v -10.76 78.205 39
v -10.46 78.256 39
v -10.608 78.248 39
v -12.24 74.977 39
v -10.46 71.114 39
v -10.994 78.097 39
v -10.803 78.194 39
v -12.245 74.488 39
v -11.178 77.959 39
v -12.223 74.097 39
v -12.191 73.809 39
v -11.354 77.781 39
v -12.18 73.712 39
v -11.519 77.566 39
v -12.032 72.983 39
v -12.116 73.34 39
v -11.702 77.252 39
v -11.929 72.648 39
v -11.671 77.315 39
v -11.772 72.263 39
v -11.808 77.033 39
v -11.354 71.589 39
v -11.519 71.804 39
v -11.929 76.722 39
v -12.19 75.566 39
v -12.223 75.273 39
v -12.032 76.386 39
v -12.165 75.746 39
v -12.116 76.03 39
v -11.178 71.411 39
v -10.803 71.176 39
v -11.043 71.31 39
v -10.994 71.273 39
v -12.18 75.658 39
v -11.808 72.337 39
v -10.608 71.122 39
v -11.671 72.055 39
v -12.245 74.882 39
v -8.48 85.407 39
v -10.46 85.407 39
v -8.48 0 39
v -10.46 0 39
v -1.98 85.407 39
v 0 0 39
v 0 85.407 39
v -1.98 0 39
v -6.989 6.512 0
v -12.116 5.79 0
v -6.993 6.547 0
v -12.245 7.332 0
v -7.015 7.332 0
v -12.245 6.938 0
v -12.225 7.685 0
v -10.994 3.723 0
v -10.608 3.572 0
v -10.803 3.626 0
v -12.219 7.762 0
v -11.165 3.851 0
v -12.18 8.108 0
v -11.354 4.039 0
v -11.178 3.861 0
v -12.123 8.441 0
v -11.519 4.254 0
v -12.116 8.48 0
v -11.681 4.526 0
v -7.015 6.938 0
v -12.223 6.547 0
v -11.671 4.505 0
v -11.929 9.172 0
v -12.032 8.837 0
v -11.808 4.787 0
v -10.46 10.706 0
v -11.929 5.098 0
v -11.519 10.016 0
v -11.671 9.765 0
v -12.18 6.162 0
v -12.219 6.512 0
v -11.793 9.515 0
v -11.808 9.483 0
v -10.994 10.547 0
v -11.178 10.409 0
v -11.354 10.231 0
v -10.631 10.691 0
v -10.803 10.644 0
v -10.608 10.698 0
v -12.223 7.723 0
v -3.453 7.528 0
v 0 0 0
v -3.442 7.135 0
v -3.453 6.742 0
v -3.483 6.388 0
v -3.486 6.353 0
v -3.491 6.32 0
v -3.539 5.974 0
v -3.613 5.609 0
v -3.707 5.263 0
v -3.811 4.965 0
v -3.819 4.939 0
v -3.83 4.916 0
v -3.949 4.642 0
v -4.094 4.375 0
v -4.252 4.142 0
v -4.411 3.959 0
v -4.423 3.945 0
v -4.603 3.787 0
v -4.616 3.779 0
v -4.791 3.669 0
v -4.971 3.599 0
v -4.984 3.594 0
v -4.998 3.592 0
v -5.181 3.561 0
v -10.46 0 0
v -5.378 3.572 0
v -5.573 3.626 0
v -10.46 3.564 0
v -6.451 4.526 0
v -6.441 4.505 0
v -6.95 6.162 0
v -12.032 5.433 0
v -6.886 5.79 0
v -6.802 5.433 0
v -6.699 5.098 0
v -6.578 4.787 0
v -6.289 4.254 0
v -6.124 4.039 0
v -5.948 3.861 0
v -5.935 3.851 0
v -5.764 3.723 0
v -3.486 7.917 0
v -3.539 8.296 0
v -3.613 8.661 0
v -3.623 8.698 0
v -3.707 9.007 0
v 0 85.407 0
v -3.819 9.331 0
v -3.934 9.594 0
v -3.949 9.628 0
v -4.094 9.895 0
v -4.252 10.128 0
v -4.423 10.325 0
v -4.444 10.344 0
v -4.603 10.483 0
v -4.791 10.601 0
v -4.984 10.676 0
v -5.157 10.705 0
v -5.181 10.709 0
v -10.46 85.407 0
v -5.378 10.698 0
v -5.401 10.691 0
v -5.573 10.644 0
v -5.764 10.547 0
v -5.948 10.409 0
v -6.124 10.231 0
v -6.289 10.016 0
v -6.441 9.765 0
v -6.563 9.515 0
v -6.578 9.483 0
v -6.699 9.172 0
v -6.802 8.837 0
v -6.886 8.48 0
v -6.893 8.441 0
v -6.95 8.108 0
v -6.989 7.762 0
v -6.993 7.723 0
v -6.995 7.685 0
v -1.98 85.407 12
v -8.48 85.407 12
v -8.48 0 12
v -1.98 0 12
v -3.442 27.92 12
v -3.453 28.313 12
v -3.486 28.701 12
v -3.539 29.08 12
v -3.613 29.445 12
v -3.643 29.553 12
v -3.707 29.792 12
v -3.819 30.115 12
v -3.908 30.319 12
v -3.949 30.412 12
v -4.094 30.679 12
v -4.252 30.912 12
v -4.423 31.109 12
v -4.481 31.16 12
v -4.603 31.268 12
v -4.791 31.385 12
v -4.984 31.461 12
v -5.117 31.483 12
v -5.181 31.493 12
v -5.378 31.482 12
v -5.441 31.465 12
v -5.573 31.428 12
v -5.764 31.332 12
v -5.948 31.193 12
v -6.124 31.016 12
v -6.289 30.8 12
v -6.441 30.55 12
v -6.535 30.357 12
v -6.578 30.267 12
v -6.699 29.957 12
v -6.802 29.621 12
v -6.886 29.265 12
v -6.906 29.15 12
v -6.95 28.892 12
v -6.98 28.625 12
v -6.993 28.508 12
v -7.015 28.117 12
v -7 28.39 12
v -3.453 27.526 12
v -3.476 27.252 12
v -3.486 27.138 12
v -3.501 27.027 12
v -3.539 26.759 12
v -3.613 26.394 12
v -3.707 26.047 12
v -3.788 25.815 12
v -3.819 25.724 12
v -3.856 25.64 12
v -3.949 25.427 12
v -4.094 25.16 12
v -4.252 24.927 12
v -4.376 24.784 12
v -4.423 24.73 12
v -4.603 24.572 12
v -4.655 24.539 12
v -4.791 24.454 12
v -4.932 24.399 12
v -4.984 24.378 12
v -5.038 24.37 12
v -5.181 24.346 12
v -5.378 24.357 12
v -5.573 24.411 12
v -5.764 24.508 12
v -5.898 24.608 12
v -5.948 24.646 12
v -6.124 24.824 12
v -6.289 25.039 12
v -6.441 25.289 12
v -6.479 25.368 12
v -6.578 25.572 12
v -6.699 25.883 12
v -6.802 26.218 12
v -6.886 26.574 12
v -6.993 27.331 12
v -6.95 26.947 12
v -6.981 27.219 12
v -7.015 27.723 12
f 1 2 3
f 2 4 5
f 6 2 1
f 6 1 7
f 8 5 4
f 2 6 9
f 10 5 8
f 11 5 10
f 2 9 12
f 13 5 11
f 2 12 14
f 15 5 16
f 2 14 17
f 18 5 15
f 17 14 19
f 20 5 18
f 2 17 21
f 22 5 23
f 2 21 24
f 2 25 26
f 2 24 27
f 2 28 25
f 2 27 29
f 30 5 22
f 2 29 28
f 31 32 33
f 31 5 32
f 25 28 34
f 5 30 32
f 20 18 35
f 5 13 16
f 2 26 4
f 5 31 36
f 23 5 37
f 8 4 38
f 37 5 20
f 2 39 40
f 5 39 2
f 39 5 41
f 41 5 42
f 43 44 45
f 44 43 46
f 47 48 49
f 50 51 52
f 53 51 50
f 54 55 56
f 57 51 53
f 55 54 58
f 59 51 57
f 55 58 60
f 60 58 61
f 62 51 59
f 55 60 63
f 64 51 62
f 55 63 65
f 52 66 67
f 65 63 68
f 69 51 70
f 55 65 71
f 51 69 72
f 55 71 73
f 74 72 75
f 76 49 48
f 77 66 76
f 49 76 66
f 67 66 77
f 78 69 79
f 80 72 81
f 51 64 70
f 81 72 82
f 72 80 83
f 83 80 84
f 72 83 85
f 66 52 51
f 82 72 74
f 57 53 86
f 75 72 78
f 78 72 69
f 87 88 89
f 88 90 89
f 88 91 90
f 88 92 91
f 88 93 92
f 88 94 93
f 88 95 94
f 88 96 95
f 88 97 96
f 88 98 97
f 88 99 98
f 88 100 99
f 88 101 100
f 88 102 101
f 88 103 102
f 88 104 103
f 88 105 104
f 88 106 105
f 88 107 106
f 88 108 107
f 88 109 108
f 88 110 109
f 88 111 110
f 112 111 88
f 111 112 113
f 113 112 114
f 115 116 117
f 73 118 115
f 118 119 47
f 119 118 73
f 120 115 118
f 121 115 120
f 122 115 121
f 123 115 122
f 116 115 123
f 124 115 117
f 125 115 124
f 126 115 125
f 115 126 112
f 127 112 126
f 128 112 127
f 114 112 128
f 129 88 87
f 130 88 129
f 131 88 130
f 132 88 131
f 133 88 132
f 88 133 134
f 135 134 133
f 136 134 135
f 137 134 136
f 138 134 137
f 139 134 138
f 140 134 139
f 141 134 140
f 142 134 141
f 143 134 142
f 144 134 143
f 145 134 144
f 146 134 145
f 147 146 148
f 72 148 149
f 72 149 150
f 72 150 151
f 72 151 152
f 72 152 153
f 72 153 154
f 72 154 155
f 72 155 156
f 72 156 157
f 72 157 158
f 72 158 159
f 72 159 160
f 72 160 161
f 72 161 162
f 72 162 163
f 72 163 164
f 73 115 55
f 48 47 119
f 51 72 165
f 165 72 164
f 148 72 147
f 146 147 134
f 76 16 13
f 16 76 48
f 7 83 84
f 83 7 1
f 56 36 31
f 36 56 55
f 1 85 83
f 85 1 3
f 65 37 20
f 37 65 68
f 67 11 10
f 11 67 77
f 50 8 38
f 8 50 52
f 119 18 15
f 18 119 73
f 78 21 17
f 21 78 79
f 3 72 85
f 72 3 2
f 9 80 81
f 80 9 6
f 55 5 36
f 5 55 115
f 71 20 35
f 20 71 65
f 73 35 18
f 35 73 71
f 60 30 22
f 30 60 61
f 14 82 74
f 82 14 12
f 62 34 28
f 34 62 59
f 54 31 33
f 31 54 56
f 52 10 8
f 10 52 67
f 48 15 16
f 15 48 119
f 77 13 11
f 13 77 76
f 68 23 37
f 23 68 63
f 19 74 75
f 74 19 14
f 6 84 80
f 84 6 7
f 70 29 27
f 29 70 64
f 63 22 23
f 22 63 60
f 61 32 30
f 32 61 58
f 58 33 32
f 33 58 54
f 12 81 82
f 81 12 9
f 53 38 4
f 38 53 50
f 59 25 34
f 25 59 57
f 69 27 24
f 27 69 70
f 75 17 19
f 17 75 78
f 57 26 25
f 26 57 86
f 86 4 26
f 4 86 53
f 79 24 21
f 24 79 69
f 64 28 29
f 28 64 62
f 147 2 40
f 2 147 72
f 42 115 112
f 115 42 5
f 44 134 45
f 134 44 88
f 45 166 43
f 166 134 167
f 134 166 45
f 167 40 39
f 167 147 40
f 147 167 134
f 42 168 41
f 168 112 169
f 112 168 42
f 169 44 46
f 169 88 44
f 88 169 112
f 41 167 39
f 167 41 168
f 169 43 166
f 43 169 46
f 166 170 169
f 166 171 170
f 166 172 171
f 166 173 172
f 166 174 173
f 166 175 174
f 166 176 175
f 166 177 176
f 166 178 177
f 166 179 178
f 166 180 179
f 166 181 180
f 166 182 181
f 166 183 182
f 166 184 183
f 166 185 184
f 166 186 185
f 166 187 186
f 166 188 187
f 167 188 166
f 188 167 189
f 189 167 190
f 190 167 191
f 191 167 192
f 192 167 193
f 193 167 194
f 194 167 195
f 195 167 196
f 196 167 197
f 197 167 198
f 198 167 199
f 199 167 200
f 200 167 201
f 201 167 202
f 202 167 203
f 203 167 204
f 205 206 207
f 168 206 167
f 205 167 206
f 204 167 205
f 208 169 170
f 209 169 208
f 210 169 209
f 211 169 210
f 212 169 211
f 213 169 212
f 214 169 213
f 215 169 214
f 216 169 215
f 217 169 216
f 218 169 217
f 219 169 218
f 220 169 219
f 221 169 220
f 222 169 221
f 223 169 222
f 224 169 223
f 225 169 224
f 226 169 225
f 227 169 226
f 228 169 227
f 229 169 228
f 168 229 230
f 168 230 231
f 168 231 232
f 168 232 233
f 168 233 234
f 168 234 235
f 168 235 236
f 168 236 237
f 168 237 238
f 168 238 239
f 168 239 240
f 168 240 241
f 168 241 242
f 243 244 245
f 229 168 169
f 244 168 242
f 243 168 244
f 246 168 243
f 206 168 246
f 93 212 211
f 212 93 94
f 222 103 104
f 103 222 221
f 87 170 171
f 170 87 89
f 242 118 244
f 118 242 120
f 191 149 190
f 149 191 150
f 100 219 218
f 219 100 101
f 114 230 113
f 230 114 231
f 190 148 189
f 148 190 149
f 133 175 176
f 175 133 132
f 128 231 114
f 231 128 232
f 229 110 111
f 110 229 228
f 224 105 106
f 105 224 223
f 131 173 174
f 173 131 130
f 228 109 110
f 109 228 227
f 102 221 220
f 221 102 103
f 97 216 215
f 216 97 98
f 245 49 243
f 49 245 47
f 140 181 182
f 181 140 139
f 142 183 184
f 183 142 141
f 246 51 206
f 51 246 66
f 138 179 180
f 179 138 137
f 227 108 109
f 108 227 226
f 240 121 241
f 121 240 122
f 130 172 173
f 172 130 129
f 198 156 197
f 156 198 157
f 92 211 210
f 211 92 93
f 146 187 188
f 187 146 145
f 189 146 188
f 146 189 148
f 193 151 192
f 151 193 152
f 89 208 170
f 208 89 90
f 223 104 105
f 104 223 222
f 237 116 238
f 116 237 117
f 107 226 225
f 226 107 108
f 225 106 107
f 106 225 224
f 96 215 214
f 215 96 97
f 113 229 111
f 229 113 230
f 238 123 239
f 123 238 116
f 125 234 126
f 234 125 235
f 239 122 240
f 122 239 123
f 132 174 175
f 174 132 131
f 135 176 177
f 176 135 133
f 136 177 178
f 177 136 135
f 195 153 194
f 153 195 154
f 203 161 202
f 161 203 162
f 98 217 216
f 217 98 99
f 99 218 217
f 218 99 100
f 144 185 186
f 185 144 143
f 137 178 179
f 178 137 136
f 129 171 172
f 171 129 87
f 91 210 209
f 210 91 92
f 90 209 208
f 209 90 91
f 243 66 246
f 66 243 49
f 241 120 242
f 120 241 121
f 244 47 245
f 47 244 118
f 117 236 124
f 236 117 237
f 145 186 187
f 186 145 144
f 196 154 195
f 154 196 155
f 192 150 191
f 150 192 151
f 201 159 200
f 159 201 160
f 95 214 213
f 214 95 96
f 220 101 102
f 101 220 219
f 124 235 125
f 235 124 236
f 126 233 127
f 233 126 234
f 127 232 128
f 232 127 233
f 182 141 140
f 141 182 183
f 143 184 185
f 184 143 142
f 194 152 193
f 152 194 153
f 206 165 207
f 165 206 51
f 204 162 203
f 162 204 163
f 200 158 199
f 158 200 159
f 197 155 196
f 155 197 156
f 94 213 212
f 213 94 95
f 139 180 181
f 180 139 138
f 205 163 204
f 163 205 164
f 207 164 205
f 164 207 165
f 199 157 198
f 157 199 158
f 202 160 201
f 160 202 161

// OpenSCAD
// Parametric angled edge hole jig, created by Nick Estes <nick@nickstoys.com>
// Released under a Creative Commons - attribute - share alike license

fin_thickness = 6.5;
jig_width = 27;
hole_angle = 60;
hole_dia = 0.125*25.4;
thickness = 1.98;
drill_guide_length = 12;

fudge_factor = 0.4;

$fs = 0.2;
$fa = 0.2;

jig_length = tan(hole_angle)*(jig_width+drill_guide_length+thickness*2+hole_dia*2);

rotate([0,-90,0]) difference() {
    union() {
        cube([jig_width+drill_guide_length,jig_length,fin_thickness+thickness*2]);
        translate([0,0,thickness*2+fin_thickness-hole_dia/2-1]) intersection() {
            cube([jig_width+drill_guide_length,jig_length,fin_thickness+thickness*2]);
            translate([0,0,hole_dia/2+1]) rotate([0,0,hole_angle]) rotate([0,90,0]) translate([0,hole_dia/2+thickness,-5]) cylinder((jig_width+drill_guide_length)/cos(hole_angle)+40, d=hole_dia+fudge_factor);
        }
    }
    translate([drill_guide_length,-0.5,thickness]) cube([jig_width+1,jig_length+1,fin_thickness]);
    translate([0,0,thickness+fin_thickness/2]) rotate([0,0,hole_angle]) rotate([0,90,0]) translate([0,hole_dia/2+thickness,-5]) cylinder((jig_width+drill_guide_length)/cos(hole_angle)+40, d=hole_dia+fudge_factor);
}
